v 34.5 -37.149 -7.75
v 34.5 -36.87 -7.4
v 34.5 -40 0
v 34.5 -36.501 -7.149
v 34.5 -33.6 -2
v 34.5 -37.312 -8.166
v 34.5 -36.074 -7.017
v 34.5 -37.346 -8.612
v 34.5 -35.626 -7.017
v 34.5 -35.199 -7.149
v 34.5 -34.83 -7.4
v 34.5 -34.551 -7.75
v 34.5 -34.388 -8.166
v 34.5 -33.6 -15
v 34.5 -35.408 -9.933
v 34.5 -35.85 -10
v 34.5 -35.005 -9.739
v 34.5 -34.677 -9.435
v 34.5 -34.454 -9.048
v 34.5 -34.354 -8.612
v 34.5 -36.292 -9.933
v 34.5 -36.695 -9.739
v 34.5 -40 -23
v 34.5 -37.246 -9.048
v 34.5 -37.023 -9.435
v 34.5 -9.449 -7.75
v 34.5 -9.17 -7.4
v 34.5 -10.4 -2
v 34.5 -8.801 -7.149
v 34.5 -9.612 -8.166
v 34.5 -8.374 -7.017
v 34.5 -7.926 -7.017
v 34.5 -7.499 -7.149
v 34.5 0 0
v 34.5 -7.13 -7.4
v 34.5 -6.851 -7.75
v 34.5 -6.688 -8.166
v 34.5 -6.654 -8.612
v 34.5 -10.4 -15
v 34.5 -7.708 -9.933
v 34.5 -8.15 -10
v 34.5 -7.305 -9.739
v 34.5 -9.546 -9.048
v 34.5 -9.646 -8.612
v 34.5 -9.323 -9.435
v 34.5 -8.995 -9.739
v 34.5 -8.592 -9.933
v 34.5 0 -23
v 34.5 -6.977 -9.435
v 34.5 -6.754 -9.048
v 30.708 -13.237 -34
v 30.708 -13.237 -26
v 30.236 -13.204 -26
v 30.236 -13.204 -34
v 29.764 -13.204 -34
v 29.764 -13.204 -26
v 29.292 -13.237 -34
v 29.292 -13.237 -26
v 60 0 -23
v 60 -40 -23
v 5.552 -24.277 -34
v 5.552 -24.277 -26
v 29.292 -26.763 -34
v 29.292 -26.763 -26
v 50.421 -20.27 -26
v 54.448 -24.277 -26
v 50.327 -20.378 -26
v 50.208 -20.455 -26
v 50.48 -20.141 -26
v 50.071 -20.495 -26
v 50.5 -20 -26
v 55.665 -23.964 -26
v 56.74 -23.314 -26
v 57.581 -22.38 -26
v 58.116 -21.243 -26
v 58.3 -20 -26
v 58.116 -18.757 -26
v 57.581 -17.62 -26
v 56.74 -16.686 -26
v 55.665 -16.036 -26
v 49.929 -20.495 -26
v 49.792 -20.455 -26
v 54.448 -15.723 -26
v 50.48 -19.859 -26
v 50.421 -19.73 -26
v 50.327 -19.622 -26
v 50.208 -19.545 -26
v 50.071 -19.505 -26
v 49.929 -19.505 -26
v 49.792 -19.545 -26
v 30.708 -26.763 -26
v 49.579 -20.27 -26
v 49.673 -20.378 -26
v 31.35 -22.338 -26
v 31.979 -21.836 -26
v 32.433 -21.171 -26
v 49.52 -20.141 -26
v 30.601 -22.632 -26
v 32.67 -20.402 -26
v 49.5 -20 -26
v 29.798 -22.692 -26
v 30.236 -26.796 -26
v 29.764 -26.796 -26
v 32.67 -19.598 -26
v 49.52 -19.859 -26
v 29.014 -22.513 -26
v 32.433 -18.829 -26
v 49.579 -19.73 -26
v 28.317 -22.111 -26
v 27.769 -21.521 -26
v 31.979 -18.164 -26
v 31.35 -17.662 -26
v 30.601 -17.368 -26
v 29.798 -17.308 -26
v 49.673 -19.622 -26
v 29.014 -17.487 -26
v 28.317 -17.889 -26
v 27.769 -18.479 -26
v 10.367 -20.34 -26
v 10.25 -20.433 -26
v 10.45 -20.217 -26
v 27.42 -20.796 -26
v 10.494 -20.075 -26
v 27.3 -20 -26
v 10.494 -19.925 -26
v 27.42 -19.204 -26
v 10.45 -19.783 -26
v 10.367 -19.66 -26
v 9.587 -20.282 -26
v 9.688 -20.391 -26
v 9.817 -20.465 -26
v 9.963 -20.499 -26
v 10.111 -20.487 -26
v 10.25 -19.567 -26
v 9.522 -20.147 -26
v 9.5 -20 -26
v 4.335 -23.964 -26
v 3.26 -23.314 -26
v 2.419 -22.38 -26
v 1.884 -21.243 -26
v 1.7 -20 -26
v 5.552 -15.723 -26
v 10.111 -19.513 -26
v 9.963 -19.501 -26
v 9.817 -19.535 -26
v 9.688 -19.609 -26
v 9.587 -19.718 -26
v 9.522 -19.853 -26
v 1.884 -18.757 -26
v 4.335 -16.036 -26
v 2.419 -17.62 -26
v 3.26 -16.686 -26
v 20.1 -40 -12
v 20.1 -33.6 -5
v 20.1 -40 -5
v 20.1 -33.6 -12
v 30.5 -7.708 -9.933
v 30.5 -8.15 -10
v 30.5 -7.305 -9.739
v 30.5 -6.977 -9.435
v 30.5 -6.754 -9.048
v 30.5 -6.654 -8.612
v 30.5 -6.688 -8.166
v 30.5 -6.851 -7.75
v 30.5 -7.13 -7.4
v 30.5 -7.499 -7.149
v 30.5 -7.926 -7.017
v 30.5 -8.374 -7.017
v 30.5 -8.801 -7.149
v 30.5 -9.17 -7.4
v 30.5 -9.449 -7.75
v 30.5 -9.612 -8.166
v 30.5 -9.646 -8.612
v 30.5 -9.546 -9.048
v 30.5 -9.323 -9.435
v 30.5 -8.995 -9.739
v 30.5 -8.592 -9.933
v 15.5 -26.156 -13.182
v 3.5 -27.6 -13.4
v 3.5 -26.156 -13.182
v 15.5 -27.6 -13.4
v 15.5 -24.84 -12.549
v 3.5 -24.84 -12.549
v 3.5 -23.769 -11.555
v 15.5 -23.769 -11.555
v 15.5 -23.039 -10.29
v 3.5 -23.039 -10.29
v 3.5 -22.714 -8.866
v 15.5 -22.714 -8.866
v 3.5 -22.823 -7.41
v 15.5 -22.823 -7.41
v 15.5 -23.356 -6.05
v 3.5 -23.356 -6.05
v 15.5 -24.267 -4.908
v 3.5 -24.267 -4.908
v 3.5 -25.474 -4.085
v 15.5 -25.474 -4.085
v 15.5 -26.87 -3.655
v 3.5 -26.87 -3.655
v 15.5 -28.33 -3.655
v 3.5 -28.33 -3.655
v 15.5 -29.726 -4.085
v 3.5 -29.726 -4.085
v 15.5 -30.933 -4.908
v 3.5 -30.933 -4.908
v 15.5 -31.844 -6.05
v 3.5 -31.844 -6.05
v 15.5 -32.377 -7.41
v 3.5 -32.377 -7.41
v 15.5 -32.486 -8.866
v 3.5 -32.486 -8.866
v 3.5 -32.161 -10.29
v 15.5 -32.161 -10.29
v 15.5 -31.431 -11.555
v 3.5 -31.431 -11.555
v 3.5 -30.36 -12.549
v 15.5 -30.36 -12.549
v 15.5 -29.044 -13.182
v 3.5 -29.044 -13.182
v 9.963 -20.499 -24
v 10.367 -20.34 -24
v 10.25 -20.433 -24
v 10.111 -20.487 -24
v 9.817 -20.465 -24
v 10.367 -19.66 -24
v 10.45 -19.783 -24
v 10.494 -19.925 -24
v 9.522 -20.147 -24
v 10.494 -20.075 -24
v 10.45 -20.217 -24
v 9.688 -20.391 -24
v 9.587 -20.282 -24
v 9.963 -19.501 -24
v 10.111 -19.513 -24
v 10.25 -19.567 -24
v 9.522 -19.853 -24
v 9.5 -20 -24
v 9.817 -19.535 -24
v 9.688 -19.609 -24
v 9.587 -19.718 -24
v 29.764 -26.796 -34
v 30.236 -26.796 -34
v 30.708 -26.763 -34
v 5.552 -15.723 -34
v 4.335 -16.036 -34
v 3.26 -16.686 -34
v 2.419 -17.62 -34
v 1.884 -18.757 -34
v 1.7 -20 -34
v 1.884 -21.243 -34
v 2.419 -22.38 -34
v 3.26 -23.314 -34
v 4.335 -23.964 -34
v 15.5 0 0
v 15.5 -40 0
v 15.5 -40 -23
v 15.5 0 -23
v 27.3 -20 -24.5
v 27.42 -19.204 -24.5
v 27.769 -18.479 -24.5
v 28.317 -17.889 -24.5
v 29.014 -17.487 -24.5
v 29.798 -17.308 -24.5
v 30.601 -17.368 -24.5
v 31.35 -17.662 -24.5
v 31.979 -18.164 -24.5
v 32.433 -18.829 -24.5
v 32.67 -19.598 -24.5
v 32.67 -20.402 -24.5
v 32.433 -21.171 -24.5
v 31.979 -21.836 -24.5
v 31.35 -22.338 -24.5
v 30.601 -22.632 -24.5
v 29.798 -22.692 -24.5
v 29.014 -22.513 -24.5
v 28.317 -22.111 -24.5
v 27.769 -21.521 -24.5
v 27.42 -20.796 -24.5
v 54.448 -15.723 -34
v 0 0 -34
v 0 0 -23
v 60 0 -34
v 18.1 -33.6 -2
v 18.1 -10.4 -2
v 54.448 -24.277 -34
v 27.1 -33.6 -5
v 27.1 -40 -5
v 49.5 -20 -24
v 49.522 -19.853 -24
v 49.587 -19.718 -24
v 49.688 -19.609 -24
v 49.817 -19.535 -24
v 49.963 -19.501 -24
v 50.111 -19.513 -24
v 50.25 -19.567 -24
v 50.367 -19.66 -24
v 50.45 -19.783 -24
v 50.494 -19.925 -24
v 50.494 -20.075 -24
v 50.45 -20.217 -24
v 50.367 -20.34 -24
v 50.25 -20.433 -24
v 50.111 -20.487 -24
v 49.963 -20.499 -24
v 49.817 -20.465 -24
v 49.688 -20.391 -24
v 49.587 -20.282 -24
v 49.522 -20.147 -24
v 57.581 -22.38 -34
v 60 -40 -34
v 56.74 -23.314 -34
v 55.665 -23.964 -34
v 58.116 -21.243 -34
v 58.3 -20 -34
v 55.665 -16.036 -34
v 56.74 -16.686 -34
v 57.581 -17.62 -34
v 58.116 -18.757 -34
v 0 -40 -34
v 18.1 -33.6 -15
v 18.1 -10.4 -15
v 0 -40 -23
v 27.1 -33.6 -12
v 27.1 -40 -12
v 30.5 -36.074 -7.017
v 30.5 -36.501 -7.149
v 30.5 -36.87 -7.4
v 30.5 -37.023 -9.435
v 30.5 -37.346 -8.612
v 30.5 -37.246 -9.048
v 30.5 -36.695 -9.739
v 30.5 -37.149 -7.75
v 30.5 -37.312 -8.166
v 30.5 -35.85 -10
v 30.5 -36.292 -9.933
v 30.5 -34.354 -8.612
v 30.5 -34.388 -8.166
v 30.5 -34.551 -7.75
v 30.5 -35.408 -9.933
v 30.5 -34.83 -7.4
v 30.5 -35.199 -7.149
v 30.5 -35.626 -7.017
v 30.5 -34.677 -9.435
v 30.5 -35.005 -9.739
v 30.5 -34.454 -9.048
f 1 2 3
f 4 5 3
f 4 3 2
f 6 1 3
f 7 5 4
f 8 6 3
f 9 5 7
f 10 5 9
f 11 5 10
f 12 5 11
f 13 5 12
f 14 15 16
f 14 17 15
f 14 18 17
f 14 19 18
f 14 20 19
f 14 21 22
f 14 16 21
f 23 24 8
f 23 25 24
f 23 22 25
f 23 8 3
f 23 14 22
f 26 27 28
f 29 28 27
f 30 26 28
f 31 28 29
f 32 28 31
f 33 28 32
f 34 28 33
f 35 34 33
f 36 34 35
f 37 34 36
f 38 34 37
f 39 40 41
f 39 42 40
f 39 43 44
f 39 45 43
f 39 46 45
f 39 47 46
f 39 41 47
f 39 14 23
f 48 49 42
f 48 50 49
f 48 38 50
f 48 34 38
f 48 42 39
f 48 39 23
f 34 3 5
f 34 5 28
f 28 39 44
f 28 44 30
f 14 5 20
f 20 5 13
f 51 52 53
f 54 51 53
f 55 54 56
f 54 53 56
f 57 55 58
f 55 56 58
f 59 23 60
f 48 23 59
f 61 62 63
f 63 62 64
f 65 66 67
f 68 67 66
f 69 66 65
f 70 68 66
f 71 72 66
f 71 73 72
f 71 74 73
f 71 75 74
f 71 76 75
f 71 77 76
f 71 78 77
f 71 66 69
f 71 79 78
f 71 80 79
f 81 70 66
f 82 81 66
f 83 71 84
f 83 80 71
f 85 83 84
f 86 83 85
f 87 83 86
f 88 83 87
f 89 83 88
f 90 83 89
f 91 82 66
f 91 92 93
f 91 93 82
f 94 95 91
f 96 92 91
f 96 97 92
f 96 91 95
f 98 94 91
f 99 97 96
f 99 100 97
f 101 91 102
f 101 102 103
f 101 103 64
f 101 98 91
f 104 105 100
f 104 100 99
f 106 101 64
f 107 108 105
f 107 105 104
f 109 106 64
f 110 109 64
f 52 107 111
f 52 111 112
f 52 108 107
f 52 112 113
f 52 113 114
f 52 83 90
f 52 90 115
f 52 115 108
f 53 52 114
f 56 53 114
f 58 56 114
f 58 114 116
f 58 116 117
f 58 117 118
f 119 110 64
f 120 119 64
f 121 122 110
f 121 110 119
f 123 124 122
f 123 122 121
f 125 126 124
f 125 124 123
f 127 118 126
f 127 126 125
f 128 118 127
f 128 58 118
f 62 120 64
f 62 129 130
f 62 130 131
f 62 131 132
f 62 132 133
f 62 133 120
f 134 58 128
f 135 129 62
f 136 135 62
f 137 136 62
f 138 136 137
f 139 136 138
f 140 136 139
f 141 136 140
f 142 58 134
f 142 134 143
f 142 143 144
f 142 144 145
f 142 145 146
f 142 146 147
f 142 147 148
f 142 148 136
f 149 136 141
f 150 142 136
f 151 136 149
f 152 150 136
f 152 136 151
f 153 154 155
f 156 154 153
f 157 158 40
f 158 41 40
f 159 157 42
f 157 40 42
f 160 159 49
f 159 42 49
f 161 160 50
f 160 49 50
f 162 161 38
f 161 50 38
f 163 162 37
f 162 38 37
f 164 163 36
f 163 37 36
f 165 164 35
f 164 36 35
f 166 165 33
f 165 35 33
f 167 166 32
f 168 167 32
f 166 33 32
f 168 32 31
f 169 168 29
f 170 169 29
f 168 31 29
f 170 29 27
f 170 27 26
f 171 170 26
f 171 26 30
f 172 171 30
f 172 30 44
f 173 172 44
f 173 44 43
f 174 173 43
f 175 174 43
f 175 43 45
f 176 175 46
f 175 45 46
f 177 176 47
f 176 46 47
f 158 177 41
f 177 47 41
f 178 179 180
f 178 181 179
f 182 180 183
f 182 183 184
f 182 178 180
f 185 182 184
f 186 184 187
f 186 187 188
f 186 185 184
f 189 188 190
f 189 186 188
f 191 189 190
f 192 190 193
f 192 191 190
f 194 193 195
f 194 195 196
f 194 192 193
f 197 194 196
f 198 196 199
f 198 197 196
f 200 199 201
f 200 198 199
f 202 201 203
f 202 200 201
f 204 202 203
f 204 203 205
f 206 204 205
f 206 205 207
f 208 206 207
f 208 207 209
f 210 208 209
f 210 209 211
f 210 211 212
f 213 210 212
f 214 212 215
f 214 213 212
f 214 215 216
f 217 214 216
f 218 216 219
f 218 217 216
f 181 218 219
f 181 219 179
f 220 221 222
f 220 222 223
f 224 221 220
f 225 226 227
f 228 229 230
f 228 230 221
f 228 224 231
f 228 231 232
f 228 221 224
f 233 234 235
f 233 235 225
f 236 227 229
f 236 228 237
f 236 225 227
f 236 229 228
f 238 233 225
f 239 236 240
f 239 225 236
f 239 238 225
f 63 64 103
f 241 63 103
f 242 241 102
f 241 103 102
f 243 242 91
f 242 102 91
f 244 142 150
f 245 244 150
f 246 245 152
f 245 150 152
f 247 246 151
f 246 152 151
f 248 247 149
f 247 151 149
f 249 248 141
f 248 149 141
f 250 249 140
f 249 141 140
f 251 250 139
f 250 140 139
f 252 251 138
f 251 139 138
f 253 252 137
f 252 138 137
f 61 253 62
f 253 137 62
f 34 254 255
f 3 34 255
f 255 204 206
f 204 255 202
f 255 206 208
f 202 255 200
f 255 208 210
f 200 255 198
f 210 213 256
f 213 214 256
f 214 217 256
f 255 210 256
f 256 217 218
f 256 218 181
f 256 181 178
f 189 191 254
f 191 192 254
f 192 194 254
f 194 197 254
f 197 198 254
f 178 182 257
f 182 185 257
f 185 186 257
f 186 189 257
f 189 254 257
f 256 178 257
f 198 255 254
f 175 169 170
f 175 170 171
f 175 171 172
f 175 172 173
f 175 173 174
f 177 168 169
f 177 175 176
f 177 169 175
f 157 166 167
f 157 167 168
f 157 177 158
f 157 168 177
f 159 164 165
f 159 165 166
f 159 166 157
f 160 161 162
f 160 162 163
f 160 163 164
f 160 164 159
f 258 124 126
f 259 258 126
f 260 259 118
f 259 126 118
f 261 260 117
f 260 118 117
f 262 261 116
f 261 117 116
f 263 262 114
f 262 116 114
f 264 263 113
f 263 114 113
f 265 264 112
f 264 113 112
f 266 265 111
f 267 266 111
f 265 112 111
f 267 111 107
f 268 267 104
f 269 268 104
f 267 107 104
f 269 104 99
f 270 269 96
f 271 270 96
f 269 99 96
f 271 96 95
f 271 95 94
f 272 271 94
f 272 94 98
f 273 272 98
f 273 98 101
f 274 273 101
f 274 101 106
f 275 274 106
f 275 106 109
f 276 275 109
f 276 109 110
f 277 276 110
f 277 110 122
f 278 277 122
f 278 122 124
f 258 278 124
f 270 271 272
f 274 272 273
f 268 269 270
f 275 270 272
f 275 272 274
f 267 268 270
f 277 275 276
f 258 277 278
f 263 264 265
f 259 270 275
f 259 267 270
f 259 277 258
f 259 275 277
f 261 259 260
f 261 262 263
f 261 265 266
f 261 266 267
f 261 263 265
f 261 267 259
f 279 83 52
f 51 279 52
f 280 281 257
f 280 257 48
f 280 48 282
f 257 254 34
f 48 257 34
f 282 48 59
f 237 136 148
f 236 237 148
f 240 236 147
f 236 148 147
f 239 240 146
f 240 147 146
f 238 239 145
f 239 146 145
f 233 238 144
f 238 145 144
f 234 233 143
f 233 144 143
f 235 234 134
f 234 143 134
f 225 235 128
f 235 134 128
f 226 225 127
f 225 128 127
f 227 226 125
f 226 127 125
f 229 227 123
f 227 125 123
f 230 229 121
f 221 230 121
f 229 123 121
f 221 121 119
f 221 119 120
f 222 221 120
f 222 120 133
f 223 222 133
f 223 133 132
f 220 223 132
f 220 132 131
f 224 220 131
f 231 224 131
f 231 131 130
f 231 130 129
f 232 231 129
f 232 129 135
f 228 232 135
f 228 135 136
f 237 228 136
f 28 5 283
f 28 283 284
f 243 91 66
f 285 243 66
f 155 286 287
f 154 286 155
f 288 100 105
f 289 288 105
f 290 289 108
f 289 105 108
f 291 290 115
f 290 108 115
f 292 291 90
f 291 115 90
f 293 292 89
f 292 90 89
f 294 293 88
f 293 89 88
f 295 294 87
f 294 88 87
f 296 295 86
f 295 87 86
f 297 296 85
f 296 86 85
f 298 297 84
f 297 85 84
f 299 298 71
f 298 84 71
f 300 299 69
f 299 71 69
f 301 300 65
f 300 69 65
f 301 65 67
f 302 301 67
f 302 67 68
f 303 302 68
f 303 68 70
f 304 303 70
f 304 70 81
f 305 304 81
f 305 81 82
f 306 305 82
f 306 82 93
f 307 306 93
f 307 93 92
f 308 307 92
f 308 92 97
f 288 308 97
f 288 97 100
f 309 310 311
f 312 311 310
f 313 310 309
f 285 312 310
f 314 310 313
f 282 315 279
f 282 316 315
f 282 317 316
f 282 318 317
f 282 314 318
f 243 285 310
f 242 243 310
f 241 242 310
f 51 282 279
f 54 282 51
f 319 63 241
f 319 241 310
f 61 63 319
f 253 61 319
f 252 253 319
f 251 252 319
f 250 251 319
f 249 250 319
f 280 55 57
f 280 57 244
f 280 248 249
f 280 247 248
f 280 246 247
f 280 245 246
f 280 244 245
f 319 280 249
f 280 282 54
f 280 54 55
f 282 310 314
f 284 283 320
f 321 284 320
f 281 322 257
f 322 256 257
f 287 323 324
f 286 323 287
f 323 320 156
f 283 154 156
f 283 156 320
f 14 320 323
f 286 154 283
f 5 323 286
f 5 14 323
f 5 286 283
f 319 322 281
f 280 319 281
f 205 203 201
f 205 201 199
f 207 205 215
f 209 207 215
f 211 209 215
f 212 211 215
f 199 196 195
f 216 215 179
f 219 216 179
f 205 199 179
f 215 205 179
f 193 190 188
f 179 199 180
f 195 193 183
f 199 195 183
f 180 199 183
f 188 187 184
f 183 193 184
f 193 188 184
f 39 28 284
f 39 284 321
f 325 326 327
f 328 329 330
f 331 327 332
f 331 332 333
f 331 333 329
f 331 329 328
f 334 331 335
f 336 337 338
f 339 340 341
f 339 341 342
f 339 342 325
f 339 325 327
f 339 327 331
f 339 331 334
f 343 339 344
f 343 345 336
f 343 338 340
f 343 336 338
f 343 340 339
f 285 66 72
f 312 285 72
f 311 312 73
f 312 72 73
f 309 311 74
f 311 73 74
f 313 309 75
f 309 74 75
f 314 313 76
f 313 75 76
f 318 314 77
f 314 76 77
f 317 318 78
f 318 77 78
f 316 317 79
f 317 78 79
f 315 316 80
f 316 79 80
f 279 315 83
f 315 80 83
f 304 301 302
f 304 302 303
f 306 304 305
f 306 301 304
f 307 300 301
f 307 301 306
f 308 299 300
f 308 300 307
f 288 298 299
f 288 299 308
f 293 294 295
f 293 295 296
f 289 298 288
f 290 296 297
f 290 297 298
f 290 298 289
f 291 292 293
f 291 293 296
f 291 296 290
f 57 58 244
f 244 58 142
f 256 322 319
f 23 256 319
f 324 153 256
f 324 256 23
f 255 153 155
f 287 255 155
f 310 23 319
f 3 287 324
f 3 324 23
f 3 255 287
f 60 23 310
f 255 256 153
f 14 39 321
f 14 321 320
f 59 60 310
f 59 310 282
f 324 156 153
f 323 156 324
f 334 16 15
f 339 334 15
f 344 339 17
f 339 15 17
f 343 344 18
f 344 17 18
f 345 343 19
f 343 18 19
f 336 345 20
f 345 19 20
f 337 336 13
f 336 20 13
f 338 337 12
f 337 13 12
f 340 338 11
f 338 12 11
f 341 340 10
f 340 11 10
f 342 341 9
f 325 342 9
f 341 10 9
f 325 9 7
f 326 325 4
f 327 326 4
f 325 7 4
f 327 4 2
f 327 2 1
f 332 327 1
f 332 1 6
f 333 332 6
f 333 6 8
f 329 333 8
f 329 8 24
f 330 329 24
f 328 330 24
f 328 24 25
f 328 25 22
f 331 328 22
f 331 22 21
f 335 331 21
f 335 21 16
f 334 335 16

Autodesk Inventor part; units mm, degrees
ref_plane "YZ Plane" through (0, 0, 0) normal (1, 0, 0) x (0, 1, 0)
sketch "スケッチ12" plane through (0, 0, 0) normal (1, 0, 0) x (0, 1, 0)
  line L0 (0, 0) -> (-40, 0)
  line L1 (-40, 0) -> (-40, -30)
  line L2 (-40, -30) -> (0, -30)
  line L3 (0, -30) -> (0, 0)
  dimension "d86" = 40
  dimension "d87" = 30
extrude "押し出し15" add sketch "スケッチ12" along normal blind 60
sketch "スケッチ13" plane through (60, 0, 0) normal (1, 0, 0) x (0, 0, -1)
  line L0 (0, 0) -> (0, -2)
  line L1 (2, -10.4) -> (15, -10.4)
  line L2 (15, -10.4) -> (15, -33.6)
  line L3 (15, -33.6) -> (2, -33.6)
  line L4 (2, -33.6) -> (2, -10.4)
  line L5 (30, 0) -> (0, 0) projected
  line L6 (30, -40) -> (30, 0) projected
  line L7 (0, 0) -> (0, -40) projected
  line L8 (0, -40) -> (30, -40) projected
  line L9 (30, -40) -> (30, 0) projected
  line L10 (30, 0) -> (0, 0) projected
  line L11 (0, 0) -> (0, -40) projected
  line L12 (0, -40) -> (30, -40) projected
  line L13 (23, -40) -> (23, 0)
  point P0 (-10, 3.6606)
  point P1 (23, 0)
  point P2 (8.5, -27.6)
  dimension "d94" = 23.2
  dimension "d95" = 10.4
  dimension "d99" = 13
  dimension "d130" = 8
  dimension "d137" = 6
  dimension "d138" = 6.5
  dimension "d145" = 15
  dimension "d146" = 2
extrude "押し出し16" cut sketch "スケッチ13" against normal blind 16.4 contours L1 L2 L3 L4
sketch "スケッチ14" plane through (0, -40, -30) normal (0, 0, -1) x (-1, 0, 0)
  line L0 (0, 0) -> (0, 40) projected
  line L1 (0, 40) -> (-60, 40) projected
  line L2 (-60, 0) -> (-60, 40) projected
  line L3 (0, 0) -> (-60, 0) projected
  circle A0 centre (-30, 20) radius 2.7
  circle A1 centre (-30, 20) radius 4.75
  line L4 (-30, 20) -> (-54, 20)
  line L5 (-30, 20) -> (-6, 20)
  circle A2 centre (-30, 20) radius 6.5
  circle A3 centre (-6, 20) radius 4
  line L6 (-30, 13.5) -> (-30, 26.5)
  circle A4 centre (-54, 20) radius 4
  line L7 (-29.3229, 13.5354) -> (-5.5833, 16.0218)
  line L8 (-5.5833, 23.9782) -> (-29.3229, 26.4646)
  line L9 (-30.6771, 26.4646) -> (-54.4167, 23.9782)
  line L10 (-30.6771, 13.5354) -> (-54.4167, 16.0218)
  circle A5 centre (-54, 20) radius 0.5
  circle A6 centre (-50, 20) radius 0.5
  circle A7 centre (-46, 20) radius 0.5
  circle A8 centre (-42, 20) radius 0.5
  circle A9 centre (-38, 20) radius 0.5
  circle A10 centre (-6, 20) radius 0.5
  circle A11 centre (-10, 20) radius 0.5
  circle A12 centre (-14, 20) radius 0.5
  circle A13 centre (-18, 20) radius 0.5
  circle A14 centre (-22, 20) radius 0.5
  line L11 (44.5, 22.6) -> (44.5, 22.6)
  line L12 (-15.5, 0) -> (-15.5, 0)
  line L13 (-46.2012, 14.0596) -> (-13.7988, 25.9404)
  line L14 (44.5, 0) -> (44.5, 0)
  line L15 (-15.5, 22.6) -> (-15.5, 22.6)
  line L16 (44.5, 22.6) -> (44.5, 22.6)
  line L17 (44.5, 22.6) -> (-15.5, 0)
  line L18 (44.5, 22.6) -> (-15.5, 22.6)
  line L19 (-15.5, 22.6) -> (44.5, 0)
  point P0 (16, 11.6)
  point P1 (-30, 20)
  point P2 (14.5, 11.3)
  dimension "d170" = 5.4
  dimension "d171" = 9.5
  dimension "d172" = 24
  dimension "d173" = 24
  dimension "d174" = 13
  dimension "d175" = 8
  dimension "d176" = 0
  dimension "d177" = 0
  dimension "d178" = 1
  dimension "d179" = 1
  dimension "d180" = 4
  dimension "d181" = 1
  dimension "d182" = 1
  dimension "d183" = 1
  dimension "d184" = 4
  dimension "d185" = 4
  dimension "d186" = 4
  dimension "d187" = 30
  dimension "d188" = 20
extrude "押し出し17" cut sketch "スケッチ14" against normal blind 4 contours A10 | L19 A11 A3 L18 | A3 A11 L5 L19 | L18 A3 | L7 A2 L5 A14 A13 A12 A11 A3 | L5 A11 L19 | A3 L18 L19 A11 L5 A12 A13 A14 A2 L13 L8 | A3 L19 L18 | A11 L5 A3 | A3 L5 A11 | A2 L6 A1 L5 | L5 A3 A11 L19 | L19 A11 | L13 A2 L8 | L19 A11 A3 | L5 A11 A3 | A2 L13 A1 L6 | L5 A1 L13 A2 | A2 L13 A1 L6 | A12 L5 | L5 A12 | L10 L13 A2 | L6 A0 L5 A1 | A1 L13 A0 L6 | L5 A0 L13 A1 | A14 L5 | L5 A14 | L6 A1 L4 A2 | L13 A0 L6 A1 | L13 L10 A4 A6 L4 A7 A8 A9 A2 | A2 L4 A1 L13 | A1 L4 A0 L13 | L6 L5 A0 | A0 L13 L6 | L5 L13 A0 | A2 L4 A9 A8 A7 A6 A4 L9 | L6 A0 L4 A1 | L13 L6 A0 | A13 L5 | L5 A13 | A5 | A4 A6 | A0 L4 L13 | L4 A0 L6 | A9 L4 | L4 A9 | A6 L4 A4 | A4 L4 A6 | A6 L4 A4 | A4 L4 A6 | A8 L4 | L4 A8 | A7 L4 | L4 A7
ref_plane "作業平面3" through (25, 0, 0) normal (1, 0, 0) x (0, 0, -1)
ref_plane "作業平面4" through (34.5, 0, 0) normal (1, 0, 0) x (0, 0, -1)
ref_plane "作業平面5" through (15.5, 0, 0) normal (1, 0, 0) x (0, 0, -1)
sketch "スケッチ15" plane through (34.5, 0, 0) normal (1, 0, 0) x (0, 0, -1)
  line L0 (2, -10.4) -> (15, -10.4) projected
  line L1 (15, -33.6) -> (2, -33.6) projected
  line L2 (15, -10.4) -> (15, -33.6) projected
  line L3 (2, -10.4) -> (15, -10.4) projected
  line L4 (2, -33.6) -> (2, -10.4) projected
  point P0 (0, 0)
extrude "押し出し19" cut sketch "スケッチ13" along normal blind 30 from surface at -25.5 contours L5 L13 L8 L7 L0 | L1 L2 L3 L4
extrude "押し出し20" cut sketch "スケッチ13" against normal blind 30 from surface at -44.5 contours L5 L13 L8 L7 L0 | L1 L2 L3 L4
extrude "押し出し21" cut sketch "スケッチ13" against normal blind 16.4 from surface at -25.5 contours L1 L2 L3 L4
sketch "スケッチ16" plane through (15.5, 0, 0) normal (1, 0, 0) x (0, 0, -1)
  line L0 (23, 0) -> (23, -40) projected
  line L1 (0, -40) -> (23, -40) projected
  line L2 (0, 0) -> (0, -40) projected
  line L3 (23, 0) -> (0, 0) projected
  line L4 (15, -33.6) -> (2, -33.6) projected
  line L5 (2, -33.6) -> (2, -10.4) projected
  line L6 (15, -10.4) -> (15, -33.6) projected
  line L7 (2, -10.4) -> (15, -10.4) projected
  circle A0 centre (8.5, -27.6) radius 4.9
  dimension "d140" = 6
  dimension "d141" = 6.5
  dimension "d142" = 9.8
extrude "押し出し22" add sketch "スケッチ16" against normal blind 12 contours A0
sketch "スケッチ17" plane through (18.1, -33.6, -2) normal (0, 1, 0) x (1, 0, 0)
  line L0 (2, 10) -> (9, 10)
  line L1 (9, 10) -> (9, 3)
  line L2 (9, 3) -> (2, 3)
  line L3 (2, 3) -> (2, 10)
  line L4 (0, 13) -> (0, 0) projected
  line L5 (0, 13) -> (16.4, 13) projected
  point P0 (-18.1, -2)
  dimension "d147" = 7
  dimension "d148" = 7
  dimension "d149" = 2
  dimension "d150" = 3
extrude "押し出し23" cut sketch "スケッチ17" against normal blind 10
extrude "押し出し24" cut sketch "スケッチ14" against normal blind 1.5 from surface at -4 contours L6 L5 A0 | A0 L13 L6 | L5 L13 A0 | L13 L6 A0 | A0 L4 L13 | L4 A0 L6
ref_plane "作業平面7" through (58, -38, -30) normal (0, 0, -1) x (-1, 0, 0)
sketch "スケッチ18" plane through (58, -38, -30) normal (0, 0, -1) x (-1, 0, 0)
  circle A0 centre (27.1663, 23.0232) radius 2.7 projected
  line L0 (51.583, 19.0449) -> (27.8434, 16.5585) projected
  arc A1 (51.583, 19.0449) -> (51.583, 27.0014) centre (51.1663, 23.0232) ccw projected
  line L1 (27.8434, 29.4878) -> (51.583, 27.0014) projected
  arc A2 (27.8434, 29.4878) -> (26.4892, 29.4878) centre (27.1663, 23.0232) ccw projected
  line L2 (2.7497, 27.0014) -> (26.4892, 29.4878) projected
  arc A3 (2.7497, 27.0014) -> (2.7497, 19.0449) centre (3.1663, 23.0232) ccw projected
  line L3 (26.4892, 16.5585) -> (2.7497, 19.0449) projected
  arc A4 (26.4892, 16.5585) -> (27.8434, 16.5585) centre (27.1663, 23.0232) ccw projected
  line L4 (3.5833, 21.9782) -> (27.3229, 24.4646) projected
  line L5 (52.4167, 14.0218) -> (28.6771, 11.5354) projected
  arc A5 (52.4167, 14.0218) -> (52.4167, 21.9782) centre (52, 18) ccw projected
  line L6 (28.6771, 24.4646) -> (52.4167, 21.9782) projected
  arc A6 (28.6771, 24.4646) -> (27.3229, 24.4646) centre (28, 18) ccw projected
  line L7 (3.5833, 21.9782) -> (27.3229, 24.4646) projected
  arc A7 (3.5833, 21.9782) -> (3.5833, 14.0218) centre (4, 18) ccw projected
  line L8 (27.3229, 11.5354) -> (3.5833, 14.0218) projected
  arc A8 (27.3229, 11.5354) -> (28.6771, 11.5354) centre (28, 18) ccw projected
  arc A9 (3.5521, 22.2766) -> (3.5521, 13.7234) centre (4, 18) ccw
  line L9 (3.5521, 22.2766) -> (27.2917, 24.763)
  arc A10 (28.7083, 24.763) -> (27.2917, 24.763) centre (28, 18) ccw
  line L10 (28.7083, 24.763) -> (52.4479, 22.2766)
  arc A11 (52.4479, 13.7234) -> (52.4479, 22.2766) centre (52, 18) ccw
  line L11 (52.4479, 13.7234) -> (28.7083, 11.237)
  arc A12 (27.2917, 11.237) -> (28.7083, 11.237) centre (28, 18) ccw
  line L12 (27.2917, 11.237) -> (3.5521, 13.7234)
  point P0 (58, 38)
  dimension "d189" = 0.3
extrude "押し出し25" cut sketch "スケッチ18" against normal blind 4 contours L6 A6 L4 A0 L9 A10 L10 | A0 L10 A11 A1 A5 L6 | L4 A7 A3 A9 L9 A0 | A1 A11 L11 A12 L12 A9 A3 A7 L8 A8 L5 A5
extrude "押し出し26" cut sketch "スケッチ14" against normal blind 2 from surface at -4 contours A11 L5 A3 | A3 L5 A11 | L5 A3 A11 L19 | L19 A11 | L5 A11 A3 | A6 L4 A4 | A4 L4 A6 | A6 L4 A4 | A4 L4 A6 picked at (-9.8359, 20.0907)
ref_plane "作業平面6" through (34.5, -38, 0) normal (1, 0, 0) x (0, 0, -1)
sketch "スケッチ19" plane through (34.5, -38, 0) normal (1, 0, 0) x (0, 0, -1)
  line L0 (2, 4.4) -> (2, 27.6) projected
  line L1 (2, 27.6) -> (15, 27.6) projected
  line L2 (15, 27.6) -> (15, 4.4) projected
  line L3 (15, 4.4) -> (2, 4.4) projected
  circle A0 centre (8.5, 2.15) radius 1.5
  circle A1 centre (8.5, 29.85) radius 1.5
  point P0 (0, 38)
  dimension "d161" = 3
  dimension "d162" = 3
  dimension "d163" = 2.25
  dimension "d164" = 2.25
  dimension "d165" = 6.5
  dimension "d167" = 6.5
extrude "押し出し27" cut sketch "スケッチ19" against normal blind 4 contours A0 | A1
sketch "スケッチ20" plane through (0, -40, -30) normal (0, 0, -1) x (-1, 0, 0)
  arc A0 (-29.2917, 26.763) -> (-30.7083, 26.763) centre (-30, 20) ccw projected
  line L0 (-29.2917, 26.763) -> (-5.5521, 24.2766) projected
  arc A1 (-5.5521, 15.7234) -> (-5.5521, 24.2766) centre (-6, 20) ccw projected
  line L1 (-5.5521, 15.7234) -> (-29.2917, 13.237) projected
  arc A2 (-30.7083, 13.237) -> (-29.2917, 13.237) centre (-30, 20) ccw projected
  line L2 (-30.7083, 13.237) -> (-54.4479, 15.7234) projected
  arc A3 (-54.4479, 24.2766) -> (-54.4479, 15.7234) centre (-54, 20) ccw projected
  line L3 (-54.4479, 24.2766) -> (-30.7083, 26.763) projected
  line L4 (0, 40) -> (-60, 40) projected
  line L5 (-60, 0) -> (-60, 40) projected
  line L6 (0, 0) -> (-60, 0) projected
  line L7 (0, 0) -> (0, 40) projected
  point P0 (0, 40)
extrude "押し出し28" add sketch "スケッチ20" along normal blind 4
properties part number "joint5_cover"
